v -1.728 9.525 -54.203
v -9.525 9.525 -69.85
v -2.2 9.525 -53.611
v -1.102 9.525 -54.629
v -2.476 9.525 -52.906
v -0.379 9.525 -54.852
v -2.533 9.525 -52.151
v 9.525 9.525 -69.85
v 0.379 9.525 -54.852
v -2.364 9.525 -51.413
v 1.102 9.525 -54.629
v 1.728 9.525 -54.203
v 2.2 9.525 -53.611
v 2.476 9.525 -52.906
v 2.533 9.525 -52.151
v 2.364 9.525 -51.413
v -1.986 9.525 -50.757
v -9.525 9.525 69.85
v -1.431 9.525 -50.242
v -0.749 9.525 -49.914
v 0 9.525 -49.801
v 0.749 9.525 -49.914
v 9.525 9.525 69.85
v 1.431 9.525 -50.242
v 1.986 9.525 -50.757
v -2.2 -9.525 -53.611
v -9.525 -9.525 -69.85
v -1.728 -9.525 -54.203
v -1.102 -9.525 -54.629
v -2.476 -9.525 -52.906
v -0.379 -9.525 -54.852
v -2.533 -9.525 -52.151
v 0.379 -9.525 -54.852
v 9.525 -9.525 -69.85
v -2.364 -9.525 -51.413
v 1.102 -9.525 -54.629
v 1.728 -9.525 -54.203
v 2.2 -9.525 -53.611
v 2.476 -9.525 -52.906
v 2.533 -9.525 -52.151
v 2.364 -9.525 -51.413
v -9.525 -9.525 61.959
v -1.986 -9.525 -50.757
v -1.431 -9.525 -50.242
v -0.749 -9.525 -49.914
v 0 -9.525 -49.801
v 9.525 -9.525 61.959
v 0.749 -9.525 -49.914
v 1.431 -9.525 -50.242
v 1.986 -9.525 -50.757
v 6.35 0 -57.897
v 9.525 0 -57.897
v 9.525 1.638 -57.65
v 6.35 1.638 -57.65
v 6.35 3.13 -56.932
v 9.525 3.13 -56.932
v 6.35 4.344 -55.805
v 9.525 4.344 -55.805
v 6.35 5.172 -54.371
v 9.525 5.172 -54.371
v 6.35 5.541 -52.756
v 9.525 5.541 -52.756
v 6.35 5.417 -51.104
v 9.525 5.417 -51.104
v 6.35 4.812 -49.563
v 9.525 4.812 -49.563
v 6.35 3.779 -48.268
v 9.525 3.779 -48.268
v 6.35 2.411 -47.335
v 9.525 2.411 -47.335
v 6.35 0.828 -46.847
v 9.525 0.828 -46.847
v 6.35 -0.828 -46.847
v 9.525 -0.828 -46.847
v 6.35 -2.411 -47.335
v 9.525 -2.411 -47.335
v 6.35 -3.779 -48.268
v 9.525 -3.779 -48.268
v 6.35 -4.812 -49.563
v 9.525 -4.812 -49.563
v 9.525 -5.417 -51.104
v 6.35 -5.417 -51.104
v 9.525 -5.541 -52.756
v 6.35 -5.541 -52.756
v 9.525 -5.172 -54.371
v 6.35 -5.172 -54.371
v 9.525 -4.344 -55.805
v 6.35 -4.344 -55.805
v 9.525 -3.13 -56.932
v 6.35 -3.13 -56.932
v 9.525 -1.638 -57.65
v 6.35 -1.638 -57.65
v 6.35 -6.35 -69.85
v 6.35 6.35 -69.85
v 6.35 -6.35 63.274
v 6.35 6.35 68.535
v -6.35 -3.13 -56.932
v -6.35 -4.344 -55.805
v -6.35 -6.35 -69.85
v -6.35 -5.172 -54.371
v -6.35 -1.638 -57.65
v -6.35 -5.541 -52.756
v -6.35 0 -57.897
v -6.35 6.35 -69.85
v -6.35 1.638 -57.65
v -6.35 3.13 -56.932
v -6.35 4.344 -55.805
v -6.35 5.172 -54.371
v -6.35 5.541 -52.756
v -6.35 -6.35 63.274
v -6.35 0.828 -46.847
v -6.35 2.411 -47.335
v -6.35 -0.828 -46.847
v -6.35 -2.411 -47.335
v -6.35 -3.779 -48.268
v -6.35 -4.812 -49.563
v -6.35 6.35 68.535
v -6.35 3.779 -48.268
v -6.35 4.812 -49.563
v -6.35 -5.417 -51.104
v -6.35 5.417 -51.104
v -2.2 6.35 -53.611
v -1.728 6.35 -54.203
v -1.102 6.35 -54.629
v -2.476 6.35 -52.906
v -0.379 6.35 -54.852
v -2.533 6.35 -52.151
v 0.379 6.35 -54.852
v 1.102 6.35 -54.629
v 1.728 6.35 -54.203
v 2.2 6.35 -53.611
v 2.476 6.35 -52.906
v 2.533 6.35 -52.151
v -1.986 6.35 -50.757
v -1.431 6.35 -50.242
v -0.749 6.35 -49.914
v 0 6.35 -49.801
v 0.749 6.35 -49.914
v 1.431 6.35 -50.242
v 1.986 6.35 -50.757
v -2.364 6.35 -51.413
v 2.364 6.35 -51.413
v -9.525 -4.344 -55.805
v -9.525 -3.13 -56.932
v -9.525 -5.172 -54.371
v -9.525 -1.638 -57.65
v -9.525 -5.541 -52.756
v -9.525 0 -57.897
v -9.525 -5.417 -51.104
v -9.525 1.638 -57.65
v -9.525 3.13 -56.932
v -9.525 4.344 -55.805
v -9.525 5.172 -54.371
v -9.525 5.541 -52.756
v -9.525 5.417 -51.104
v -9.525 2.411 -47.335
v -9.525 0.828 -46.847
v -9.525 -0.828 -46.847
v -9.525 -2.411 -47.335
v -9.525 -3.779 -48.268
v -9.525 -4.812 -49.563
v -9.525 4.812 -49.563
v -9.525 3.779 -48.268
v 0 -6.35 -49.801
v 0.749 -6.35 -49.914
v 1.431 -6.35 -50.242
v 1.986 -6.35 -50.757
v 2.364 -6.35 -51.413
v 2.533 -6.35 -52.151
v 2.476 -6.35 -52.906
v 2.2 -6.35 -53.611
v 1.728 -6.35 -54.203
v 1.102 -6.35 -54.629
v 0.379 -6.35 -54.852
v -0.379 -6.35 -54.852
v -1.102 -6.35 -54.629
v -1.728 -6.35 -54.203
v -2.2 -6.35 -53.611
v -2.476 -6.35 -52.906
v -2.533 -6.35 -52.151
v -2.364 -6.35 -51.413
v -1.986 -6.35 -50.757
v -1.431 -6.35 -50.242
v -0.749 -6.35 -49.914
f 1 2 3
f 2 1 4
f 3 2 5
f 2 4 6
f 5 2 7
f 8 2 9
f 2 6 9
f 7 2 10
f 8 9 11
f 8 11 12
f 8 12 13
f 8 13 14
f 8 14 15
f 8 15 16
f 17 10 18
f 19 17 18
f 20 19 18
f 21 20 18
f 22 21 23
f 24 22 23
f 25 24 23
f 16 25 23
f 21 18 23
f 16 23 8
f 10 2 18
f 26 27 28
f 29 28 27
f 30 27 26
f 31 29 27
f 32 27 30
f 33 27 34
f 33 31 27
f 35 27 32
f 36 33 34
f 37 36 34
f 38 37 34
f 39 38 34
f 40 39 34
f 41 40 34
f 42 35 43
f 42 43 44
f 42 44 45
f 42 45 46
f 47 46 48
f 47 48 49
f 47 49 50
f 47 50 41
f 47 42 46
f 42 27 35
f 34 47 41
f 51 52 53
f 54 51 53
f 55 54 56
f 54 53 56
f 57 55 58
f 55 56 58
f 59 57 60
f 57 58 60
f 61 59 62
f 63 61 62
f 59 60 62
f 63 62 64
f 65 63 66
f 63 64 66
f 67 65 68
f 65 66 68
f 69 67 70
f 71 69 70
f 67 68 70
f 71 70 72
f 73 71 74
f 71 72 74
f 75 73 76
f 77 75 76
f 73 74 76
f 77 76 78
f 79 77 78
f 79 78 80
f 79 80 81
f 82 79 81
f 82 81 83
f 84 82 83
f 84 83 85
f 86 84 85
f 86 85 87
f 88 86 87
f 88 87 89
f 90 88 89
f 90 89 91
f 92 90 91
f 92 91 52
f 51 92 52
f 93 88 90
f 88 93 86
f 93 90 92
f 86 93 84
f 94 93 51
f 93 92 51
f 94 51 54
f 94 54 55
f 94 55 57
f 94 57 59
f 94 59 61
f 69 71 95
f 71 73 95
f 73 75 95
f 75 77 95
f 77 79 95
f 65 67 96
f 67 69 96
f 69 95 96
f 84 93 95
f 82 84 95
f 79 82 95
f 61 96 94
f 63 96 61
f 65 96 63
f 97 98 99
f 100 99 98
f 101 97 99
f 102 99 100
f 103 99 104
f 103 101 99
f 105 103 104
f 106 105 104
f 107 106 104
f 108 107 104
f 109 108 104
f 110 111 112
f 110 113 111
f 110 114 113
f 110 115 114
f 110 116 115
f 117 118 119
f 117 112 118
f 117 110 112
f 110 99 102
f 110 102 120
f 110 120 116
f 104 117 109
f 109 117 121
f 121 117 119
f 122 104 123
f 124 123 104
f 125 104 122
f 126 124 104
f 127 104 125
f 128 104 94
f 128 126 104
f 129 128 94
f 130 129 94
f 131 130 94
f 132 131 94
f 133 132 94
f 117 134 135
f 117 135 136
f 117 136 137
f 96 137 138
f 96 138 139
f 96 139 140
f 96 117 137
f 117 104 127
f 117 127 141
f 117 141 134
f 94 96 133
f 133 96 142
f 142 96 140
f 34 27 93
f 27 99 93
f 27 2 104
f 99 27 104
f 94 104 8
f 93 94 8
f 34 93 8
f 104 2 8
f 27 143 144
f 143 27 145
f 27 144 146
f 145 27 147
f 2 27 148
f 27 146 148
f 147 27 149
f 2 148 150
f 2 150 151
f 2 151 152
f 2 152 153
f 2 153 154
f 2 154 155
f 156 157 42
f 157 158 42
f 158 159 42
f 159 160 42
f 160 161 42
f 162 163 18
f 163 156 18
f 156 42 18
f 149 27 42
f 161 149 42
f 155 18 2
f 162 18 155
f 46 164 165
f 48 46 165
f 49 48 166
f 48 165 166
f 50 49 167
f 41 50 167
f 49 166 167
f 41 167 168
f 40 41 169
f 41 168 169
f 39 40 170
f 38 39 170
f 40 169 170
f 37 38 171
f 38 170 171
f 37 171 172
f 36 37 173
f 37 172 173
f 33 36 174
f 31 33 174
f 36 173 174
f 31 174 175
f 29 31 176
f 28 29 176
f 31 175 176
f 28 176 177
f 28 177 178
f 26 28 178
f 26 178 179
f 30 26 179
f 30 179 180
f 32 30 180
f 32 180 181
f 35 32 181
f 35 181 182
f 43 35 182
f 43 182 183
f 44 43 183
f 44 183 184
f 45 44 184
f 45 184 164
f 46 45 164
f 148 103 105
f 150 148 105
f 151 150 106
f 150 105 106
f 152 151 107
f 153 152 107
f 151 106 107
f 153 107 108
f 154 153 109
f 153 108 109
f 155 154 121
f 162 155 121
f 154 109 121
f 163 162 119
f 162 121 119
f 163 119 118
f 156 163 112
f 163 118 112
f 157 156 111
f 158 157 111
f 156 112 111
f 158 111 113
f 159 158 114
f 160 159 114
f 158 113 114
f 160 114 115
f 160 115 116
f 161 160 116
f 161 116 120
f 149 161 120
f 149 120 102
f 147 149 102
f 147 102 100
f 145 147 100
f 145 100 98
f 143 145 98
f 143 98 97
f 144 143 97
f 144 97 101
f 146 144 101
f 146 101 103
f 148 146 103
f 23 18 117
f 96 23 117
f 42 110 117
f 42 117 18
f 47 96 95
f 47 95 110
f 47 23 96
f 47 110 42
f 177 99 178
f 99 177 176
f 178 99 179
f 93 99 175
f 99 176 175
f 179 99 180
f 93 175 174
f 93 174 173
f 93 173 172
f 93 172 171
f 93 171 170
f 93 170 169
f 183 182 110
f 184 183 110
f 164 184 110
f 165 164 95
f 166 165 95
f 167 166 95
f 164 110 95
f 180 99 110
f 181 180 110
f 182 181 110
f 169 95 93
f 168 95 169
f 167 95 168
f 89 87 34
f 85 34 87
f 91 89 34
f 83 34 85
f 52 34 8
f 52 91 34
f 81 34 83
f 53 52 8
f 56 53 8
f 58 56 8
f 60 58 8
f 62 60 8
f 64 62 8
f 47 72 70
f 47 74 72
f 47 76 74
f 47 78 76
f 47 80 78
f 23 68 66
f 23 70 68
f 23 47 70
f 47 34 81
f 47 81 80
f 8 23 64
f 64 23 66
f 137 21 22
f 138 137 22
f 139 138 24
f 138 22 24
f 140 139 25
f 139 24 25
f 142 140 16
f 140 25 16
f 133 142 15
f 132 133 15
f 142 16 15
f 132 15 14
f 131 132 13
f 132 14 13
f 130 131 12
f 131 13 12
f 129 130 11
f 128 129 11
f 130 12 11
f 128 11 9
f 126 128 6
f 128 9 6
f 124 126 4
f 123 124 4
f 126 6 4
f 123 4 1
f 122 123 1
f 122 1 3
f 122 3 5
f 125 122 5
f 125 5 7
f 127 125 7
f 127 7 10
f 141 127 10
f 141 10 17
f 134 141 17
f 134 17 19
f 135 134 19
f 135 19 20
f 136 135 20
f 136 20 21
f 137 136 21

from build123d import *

# Parameters (mm, degrees)
SKETCH1_W           = 19.05
SKETCH1_H           = 19.05
SKETCH1_W_2         = 12.7
SKETCH1_H_2         = 12.7
BOSS_EXTRUDE1_DEPTH = 69.85
CUT_EXTRUDE1_DEPTH  = 74.025
SKETCH3_R           = 5.55625
CUT_EXTRUDE2_DEPTH  = 74.025
SKETCH4_R           = 2.54
CUT_EXTRUDE3_DEPTH  = 74.025


with BuildPart() as part:
    # Sketch1 → Boss-Extrude1 (new, symmetric)
    with BuildSketch(Plane.XY):
        Rectangle(SKETCH1_W, SKETCH1_H)
        Rectangle(SKETCH1_W_2, SKETCH1_H_2, mode=Mode.SUBTRACT)
    extrude(amount=BOSS_EXTRUDE1_DEPTH, both=True)

    # Sketch2 → Cut-Extrude1 (cut, through all)
    with BuildSketch(Plane(origin=(9.525, 0, 0), x_dir=(0, 0, -1), z_dir=(1, 0, 0))):
        Polygon((-69.85, 9.525), (-61.959231637, -9.525), (-69.85, -9.525), align=None)
    extrude(amount=-CUT_EXTRUDE1_DEPTH, mode=Mode.SUBTRACT)

    # Sketch3 → Cut-Extrude2 (cut, through all)
    with BuildSketch(Plane(origin=(9.525, 0, 0), x_dir=(0, 0, -1), z_dir=(1, 0, 0))):
        with Locations((52.340768363, 0)):
            Circle(SKETCH3_R)
    extrude(amount=-CUT_EXTRUDE2_DEPTH, mode=Mode.SUBTRACT)

    # Sketch4 → Cut-Extrude3 (cut, through all)
    with BuildSketch(Plane(origin=(0, 9.525, 0), x_dir=(1, 0, 0), z_dir=(0, 1, 0))):
        with Locations(Location((0, 52.340768363, 0), (0, 0, 270))):
            Circle(SKETCH4_R)
    extrude(amount=-CUT_EXTRUDE3_DEPTH, mode=Mode.SUBTRACT)


solid = part.part
